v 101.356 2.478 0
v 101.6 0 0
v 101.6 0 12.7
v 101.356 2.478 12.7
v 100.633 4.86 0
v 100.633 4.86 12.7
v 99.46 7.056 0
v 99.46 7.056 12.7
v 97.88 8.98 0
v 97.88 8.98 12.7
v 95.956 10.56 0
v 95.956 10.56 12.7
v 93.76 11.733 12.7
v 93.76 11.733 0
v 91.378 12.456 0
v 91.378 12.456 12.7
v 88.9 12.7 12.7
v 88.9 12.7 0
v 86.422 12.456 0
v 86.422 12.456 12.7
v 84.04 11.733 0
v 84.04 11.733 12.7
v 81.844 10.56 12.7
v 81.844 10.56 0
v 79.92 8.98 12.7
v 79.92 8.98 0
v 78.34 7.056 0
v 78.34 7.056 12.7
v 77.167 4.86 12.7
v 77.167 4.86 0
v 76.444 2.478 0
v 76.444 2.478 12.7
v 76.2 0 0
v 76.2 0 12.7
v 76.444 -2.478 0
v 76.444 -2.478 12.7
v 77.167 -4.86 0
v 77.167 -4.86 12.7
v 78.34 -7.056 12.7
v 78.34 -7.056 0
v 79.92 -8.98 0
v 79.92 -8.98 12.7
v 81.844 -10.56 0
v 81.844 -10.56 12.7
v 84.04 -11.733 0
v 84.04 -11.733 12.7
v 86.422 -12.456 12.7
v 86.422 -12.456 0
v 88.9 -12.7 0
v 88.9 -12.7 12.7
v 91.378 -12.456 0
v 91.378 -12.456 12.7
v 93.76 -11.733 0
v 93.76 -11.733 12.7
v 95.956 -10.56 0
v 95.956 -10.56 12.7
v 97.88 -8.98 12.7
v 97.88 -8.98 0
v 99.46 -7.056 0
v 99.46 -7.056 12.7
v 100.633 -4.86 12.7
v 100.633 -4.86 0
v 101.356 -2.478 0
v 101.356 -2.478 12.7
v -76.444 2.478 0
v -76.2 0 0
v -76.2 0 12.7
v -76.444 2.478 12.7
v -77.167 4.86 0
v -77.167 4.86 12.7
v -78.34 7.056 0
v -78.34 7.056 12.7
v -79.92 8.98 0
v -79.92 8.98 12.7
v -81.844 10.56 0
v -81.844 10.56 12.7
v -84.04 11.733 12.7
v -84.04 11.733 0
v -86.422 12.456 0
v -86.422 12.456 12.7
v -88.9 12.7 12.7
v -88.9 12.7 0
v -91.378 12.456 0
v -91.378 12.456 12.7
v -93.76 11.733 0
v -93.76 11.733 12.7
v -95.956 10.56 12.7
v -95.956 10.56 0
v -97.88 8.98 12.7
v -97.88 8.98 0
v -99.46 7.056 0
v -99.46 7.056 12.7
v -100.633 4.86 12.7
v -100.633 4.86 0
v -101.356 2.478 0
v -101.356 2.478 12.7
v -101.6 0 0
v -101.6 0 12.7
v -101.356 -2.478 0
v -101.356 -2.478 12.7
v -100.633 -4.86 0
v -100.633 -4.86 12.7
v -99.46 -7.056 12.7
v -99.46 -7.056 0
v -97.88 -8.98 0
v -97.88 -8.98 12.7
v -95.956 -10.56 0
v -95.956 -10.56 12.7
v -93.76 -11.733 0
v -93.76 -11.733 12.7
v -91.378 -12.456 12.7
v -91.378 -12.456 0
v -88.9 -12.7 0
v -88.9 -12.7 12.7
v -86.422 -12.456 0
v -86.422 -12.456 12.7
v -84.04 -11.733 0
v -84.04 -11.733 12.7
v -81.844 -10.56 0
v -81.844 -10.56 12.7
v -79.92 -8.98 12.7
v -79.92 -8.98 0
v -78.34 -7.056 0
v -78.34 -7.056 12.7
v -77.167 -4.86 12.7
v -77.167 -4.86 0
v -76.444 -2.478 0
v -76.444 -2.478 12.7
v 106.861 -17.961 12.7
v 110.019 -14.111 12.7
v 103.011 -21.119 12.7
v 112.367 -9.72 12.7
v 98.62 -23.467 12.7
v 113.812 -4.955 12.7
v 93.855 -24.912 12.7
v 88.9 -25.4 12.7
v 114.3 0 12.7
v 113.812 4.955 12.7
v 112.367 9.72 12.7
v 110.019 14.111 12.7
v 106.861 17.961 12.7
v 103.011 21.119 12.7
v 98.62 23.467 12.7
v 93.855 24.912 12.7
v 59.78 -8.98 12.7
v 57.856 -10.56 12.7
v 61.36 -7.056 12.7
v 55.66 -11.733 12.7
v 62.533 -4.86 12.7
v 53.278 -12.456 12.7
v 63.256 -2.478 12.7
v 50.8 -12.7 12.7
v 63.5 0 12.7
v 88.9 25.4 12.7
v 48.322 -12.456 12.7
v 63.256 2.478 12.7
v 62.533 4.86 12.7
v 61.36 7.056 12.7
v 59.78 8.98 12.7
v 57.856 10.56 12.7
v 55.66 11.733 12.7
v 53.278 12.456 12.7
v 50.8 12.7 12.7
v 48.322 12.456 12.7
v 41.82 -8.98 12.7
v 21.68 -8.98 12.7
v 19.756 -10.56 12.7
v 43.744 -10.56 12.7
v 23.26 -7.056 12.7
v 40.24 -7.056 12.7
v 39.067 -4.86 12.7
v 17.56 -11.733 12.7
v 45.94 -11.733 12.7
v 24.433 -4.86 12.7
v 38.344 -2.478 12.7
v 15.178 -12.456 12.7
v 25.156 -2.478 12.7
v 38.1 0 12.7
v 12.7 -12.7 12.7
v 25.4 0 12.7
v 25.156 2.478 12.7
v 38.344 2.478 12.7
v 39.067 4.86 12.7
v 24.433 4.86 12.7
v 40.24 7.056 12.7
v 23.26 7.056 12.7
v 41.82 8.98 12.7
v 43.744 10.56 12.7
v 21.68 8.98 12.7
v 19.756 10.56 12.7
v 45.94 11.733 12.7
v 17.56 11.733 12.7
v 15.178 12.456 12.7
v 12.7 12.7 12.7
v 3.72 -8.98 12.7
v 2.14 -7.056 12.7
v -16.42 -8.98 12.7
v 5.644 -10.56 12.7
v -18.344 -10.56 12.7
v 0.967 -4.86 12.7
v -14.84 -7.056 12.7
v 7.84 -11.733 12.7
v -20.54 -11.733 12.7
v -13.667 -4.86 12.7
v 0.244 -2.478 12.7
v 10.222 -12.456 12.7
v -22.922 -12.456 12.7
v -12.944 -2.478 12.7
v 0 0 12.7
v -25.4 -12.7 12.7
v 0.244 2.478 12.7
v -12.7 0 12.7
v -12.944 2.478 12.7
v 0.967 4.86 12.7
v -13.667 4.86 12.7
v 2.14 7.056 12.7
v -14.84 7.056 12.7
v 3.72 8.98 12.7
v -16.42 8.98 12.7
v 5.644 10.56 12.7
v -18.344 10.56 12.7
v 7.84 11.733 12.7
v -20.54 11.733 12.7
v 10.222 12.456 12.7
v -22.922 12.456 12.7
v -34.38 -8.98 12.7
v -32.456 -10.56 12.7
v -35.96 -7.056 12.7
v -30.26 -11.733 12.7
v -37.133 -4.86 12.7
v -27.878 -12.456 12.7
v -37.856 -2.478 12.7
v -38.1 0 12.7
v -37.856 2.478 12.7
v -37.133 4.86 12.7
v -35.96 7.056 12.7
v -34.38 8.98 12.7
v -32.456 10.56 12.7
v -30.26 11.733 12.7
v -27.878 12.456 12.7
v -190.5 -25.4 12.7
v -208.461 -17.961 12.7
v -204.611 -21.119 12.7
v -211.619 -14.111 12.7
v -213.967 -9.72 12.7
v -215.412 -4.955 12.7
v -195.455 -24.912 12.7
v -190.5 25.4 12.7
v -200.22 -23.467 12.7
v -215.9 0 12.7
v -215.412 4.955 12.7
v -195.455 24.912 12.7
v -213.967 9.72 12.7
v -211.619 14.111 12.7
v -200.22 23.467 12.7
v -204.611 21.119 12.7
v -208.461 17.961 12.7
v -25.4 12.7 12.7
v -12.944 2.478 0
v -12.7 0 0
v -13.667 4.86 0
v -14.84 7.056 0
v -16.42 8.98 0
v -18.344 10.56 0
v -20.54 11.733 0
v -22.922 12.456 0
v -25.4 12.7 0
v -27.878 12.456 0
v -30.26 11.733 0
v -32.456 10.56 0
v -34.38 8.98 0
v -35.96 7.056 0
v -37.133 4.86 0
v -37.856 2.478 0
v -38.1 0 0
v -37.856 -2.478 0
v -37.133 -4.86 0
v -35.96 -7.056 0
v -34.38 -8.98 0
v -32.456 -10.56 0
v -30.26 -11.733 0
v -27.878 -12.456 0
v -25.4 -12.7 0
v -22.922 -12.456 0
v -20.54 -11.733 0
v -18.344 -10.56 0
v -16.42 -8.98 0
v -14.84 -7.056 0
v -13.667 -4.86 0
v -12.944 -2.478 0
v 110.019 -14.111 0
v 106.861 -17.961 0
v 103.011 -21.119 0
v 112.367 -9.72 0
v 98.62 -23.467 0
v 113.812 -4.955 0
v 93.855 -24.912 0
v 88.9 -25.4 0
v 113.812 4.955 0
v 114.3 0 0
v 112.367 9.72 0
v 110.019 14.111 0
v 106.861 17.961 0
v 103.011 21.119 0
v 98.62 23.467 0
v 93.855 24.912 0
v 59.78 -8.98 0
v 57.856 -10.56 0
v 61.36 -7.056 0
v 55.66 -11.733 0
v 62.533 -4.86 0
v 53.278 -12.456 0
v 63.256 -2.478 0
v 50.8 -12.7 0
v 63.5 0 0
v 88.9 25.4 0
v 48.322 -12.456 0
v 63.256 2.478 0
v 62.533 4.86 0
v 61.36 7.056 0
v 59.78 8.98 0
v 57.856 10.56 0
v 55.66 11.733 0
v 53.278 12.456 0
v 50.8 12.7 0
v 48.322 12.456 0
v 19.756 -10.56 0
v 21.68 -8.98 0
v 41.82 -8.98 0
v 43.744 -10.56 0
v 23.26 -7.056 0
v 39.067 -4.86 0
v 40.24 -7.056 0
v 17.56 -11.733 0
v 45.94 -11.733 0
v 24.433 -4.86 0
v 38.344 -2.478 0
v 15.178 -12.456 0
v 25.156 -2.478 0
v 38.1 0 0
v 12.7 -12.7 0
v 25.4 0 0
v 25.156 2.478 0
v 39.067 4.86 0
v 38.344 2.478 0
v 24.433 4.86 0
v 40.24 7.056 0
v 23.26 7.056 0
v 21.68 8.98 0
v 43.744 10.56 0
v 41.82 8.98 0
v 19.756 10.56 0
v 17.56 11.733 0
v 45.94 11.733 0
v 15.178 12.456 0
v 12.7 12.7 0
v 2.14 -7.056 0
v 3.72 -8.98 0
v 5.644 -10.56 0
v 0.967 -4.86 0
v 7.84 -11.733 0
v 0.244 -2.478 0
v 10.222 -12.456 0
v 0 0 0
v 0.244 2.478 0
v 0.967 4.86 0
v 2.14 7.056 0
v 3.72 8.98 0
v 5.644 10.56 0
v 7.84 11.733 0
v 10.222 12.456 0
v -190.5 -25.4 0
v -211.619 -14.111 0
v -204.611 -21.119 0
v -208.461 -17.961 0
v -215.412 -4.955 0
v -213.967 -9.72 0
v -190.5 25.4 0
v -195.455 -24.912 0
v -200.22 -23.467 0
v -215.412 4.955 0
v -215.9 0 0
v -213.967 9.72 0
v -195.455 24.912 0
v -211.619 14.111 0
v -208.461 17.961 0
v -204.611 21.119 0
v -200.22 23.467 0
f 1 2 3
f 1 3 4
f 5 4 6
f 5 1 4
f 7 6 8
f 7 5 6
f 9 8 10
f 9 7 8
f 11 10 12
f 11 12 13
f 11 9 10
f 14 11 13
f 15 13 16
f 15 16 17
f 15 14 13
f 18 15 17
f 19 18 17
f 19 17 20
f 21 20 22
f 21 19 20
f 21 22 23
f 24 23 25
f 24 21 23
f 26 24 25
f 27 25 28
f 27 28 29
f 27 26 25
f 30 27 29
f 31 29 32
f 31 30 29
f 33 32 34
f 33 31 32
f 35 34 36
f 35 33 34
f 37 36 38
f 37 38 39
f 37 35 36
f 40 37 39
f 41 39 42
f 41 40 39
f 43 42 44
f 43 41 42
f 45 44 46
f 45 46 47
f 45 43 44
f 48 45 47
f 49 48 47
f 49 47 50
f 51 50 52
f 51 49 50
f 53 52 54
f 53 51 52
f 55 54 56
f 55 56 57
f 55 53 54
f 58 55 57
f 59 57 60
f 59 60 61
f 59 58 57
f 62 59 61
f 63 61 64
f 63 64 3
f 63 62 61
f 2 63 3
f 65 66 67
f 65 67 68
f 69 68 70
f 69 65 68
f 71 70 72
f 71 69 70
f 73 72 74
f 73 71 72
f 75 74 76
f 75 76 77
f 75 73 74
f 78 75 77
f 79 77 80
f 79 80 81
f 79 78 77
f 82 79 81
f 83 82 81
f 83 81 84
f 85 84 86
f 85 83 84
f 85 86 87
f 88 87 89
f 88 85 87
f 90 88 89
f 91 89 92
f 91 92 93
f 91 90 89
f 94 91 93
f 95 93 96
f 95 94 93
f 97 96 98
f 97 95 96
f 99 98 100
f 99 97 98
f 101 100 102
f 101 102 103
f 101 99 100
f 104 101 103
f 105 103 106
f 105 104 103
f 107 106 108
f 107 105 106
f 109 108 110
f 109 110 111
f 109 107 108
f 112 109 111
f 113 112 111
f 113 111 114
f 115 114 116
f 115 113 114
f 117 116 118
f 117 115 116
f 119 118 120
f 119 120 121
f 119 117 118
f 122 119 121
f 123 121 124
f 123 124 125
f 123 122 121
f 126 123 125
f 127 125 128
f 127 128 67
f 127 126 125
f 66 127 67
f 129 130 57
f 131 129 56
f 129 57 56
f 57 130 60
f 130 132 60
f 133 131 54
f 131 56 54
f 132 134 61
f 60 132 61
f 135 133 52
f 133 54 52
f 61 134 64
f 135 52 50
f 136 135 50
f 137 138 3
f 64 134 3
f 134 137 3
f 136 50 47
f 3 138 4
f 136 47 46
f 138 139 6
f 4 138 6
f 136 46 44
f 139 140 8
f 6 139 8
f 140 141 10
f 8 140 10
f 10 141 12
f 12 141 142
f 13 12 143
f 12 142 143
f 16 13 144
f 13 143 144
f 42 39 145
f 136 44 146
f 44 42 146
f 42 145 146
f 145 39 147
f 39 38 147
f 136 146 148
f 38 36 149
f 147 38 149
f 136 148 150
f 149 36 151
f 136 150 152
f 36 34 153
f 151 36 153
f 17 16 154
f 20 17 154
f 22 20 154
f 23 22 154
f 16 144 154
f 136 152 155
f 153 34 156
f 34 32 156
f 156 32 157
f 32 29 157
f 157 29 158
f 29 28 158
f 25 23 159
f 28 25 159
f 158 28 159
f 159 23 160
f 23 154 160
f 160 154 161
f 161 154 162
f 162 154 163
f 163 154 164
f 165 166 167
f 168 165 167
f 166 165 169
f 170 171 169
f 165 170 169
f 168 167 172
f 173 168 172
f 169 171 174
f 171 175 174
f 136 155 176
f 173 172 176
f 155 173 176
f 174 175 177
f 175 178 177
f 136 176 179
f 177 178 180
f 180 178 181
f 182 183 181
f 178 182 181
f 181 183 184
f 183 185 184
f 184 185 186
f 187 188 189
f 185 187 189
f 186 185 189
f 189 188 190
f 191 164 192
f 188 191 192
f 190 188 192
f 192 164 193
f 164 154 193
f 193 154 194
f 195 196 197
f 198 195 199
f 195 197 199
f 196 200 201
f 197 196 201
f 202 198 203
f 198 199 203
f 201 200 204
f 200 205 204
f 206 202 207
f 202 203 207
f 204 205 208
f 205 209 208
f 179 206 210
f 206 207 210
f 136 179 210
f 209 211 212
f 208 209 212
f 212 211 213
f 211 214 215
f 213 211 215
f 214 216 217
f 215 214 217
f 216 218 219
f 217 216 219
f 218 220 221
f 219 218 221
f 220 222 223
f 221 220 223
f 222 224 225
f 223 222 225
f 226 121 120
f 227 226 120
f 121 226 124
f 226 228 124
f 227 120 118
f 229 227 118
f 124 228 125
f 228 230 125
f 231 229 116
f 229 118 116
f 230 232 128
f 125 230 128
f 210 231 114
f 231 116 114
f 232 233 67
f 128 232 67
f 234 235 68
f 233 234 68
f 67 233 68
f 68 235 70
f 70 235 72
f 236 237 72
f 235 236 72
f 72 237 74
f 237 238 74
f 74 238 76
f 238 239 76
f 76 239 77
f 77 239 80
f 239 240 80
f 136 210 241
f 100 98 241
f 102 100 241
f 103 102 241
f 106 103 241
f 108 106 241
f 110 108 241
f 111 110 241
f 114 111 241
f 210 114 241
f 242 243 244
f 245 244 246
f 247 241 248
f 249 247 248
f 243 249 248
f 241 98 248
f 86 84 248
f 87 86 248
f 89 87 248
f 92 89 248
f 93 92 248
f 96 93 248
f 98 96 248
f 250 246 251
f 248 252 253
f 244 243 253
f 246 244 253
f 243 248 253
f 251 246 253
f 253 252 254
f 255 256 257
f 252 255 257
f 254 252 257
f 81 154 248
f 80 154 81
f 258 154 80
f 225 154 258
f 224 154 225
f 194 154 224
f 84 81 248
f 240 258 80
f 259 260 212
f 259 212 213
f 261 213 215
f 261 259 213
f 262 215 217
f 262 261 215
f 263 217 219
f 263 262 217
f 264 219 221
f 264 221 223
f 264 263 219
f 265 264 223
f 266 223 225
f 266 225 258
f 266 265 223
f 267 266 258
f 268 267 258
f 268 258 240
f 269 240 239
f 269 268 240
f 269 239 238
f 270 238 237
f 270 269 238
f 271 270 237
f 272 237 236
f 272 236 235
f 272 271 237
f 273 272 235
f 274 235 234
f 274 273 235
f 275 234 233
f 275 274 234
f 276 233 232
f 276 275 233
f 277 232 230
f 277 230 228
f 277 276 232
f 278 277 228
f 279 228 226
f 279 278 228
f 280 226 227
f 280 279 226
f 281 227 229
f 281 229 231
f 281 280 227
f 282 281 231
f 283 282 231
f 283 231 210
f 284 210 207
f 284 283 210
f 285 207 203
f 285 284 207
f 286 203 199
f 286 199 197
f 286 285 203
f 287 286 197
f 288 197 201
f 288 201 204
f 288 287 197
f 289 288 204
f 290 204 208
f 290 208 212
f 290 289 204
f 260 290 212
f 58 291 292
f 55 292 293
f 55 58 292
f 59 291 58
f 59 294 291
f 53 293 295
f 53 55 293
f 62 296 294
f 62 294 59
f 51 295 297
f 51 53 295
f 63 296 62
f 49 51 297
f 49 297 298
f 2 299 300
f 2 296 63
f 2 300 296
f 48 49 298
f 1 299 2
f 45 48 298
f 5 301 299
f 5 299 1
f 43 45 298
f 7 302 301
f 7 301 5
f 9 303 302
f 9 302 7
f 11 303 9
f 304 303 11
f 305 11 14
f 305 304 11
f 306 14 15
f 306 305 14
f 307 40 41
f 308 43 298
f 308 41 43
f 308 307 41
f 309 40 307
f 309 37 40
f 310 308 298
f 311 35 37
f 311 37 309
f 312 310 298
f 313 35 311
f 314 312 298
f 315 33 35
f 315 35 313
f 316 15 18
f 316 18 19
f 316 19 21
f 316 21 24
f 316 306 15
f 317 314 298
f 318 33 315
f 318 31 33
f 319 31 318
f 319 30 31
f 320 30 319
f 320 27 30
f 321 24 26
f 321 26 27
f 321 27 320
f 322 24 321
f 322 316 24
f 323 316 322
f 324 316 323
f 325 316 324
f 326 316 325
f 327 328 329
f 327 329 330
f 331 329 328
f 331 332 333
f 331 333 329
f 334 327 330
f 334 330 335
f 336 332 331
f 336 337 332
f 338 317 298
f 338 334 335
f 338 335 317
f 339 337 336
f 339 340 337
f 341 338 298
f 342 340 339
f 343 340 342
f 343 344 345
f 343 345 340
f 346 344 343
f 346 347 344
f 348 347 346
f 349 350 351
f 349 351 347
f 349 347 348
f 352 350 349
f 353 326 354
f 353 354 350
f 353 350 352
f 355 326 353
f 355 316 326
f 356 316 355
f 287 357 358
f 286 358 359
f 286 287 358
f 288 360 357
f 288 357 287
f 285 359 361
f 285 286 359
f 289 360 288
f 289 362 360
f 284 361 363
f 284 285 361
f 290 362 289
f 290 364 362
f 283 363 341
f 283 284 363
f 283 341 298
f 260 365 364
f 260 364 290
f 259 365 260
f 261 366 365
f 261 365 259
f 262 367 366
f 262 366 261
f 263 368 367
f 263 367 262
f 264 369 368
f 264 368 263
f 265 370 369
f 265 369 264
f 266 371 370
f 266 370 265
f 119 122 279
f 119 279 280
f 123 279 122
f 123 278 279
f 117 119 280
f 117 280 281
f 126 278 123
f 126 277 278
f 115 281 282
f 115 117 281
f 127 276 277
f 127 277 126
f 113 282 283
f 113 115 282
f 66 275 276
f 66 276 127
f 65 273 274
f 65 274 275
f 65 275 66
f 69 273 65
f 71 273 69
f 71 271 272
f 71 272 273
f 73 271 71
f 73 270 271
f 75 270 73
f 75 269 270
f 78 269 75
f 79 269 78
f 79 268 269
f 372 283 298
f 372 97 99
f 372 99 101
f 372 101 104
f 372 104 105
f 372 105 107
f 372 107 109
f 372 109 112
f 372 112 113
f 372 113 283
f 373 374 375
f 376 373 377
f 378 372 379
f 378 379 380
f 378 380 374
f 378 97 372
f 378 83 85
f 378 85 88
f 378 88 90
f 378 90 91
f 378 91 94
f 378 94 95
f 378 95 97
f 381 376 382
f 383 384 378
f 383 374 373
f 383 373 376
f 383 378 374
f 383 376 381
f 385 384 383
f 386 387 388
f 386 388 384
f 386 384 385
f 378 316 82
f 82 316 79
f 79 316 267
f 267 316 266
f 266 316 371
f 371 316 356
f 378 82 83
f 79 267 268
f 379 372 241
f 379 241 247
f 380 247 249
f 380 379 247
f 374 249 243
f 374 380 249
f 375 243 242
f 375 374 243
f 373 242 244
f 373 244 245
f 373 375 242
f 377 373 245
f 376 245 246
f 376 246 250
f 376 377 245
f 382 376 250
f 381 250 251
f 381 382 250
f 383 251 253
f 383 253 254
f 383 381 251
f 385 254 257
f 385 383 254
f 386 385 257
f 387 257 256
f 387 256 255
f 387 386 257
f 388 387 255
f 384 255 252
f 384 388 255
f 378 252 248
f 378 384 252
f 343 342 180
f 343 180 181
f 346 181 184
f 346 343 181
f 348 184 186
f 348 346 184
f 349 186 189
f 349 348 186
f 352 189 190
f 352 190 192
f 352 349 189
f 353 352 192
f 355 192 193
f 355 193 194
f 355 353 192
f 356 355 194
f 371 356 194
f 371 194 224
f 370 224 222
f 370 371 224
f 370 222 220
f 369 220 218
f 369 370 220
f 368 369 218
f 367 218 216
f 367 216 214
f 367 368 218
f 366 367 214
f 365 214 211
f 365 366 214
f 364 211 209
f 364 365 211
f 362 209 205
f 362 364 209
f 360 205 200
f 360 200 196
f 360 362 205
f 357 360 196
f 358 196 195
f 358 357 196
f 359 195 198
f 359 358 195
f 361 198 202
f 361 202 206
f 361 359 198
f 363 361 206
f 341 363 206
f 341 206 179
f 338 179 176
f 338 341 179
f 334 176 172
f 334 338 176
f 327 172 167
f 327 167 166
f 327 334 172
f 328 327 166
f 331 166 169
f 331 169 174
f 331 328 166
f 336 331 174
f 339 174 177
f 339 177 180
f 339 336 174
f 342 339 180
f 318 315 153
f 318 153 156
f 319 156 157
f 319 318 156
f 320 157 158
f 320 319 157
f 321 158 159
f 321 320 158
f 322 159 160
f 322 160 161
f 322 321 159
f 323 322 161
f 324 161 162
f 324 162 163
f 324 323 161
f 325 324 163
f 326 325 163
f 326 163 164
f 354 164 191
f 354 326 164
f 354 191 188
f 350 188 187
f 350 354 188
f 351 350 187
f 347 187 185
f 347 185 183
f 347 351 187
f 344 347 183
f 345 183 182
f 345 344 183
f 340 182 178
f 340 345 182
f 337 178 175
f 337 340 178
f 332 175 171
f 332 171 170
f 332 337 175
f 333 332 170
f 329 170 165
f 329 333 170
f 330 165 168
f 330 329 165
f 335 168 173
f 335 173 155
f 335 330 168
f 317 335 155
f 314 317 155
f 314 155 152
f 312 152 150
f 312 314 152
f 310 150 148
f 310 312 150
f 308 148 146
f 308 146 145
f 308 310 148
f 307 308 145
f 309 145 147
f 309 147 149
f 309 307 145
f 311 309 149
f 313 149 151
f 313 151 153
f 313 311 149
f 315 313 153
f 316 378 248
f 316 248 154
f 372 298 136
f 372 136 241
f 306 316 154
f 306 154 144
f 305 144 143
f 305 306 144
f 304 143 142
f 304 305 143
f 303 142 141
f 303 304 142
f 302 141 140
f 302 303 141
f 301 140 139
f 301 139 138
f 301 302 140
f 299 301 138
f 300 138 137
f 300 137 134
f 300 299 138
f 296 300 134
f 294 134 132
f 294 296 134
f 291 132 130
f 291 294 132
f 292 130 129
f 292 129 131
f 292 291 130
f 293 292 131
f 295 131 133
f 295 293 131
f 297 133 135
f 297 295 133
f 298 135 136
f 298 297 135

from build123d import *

# Parameters (mm, degrees)
SKETCH1_R           = 12.7
BOSS_EXTRUDE1_DEPTH = 12.7


with BuildPart() as part:
    # Sketch1 → Boss-Extrude1 (new body)
    with BuildSketch(Plane.XY):
        with BuildLine():
            Line((-88.9, 25.4), (88.9, 25.4))
            ThreePointArc((88.9, 25.4), (114.3, 0), (88.9, -25.4))
            Line((88.9, -25.4), (-88.9, -25.4))
            Line((-88.9, -25.4), (-190.5, -25.4))
            ThreePointArc((-190.5, -25.4), (-215.9, 0), (-190.5, 25.4))
            Line((-190.5, 25.4), (-88.9, 25.4))
        make_face()
        with Locations((-88.9, 0)):
            Circle(SKETCH1_R, mode=Mode.SUBTRACT)
        with Locations((88.9, 0)):
            Circle(SKETCH1_R, mode=Mode.SUBTRACT)
        with Locations((50.8, 0)):
            Circle(SKETCH1_R, mode=Mode.SUBTRACT)
        with Locations((12.7, 0)):
            Circle(SKETCH1_R, mode=Mode.SUBTRACT)
        with Locations((-25.4, 0)):
            Circle(SKETCH1_R, mode=Mode.SUBTRACT)
    extrude(amount=BOSS_EXTRUDE1_DEPTH)


solid = part.part
